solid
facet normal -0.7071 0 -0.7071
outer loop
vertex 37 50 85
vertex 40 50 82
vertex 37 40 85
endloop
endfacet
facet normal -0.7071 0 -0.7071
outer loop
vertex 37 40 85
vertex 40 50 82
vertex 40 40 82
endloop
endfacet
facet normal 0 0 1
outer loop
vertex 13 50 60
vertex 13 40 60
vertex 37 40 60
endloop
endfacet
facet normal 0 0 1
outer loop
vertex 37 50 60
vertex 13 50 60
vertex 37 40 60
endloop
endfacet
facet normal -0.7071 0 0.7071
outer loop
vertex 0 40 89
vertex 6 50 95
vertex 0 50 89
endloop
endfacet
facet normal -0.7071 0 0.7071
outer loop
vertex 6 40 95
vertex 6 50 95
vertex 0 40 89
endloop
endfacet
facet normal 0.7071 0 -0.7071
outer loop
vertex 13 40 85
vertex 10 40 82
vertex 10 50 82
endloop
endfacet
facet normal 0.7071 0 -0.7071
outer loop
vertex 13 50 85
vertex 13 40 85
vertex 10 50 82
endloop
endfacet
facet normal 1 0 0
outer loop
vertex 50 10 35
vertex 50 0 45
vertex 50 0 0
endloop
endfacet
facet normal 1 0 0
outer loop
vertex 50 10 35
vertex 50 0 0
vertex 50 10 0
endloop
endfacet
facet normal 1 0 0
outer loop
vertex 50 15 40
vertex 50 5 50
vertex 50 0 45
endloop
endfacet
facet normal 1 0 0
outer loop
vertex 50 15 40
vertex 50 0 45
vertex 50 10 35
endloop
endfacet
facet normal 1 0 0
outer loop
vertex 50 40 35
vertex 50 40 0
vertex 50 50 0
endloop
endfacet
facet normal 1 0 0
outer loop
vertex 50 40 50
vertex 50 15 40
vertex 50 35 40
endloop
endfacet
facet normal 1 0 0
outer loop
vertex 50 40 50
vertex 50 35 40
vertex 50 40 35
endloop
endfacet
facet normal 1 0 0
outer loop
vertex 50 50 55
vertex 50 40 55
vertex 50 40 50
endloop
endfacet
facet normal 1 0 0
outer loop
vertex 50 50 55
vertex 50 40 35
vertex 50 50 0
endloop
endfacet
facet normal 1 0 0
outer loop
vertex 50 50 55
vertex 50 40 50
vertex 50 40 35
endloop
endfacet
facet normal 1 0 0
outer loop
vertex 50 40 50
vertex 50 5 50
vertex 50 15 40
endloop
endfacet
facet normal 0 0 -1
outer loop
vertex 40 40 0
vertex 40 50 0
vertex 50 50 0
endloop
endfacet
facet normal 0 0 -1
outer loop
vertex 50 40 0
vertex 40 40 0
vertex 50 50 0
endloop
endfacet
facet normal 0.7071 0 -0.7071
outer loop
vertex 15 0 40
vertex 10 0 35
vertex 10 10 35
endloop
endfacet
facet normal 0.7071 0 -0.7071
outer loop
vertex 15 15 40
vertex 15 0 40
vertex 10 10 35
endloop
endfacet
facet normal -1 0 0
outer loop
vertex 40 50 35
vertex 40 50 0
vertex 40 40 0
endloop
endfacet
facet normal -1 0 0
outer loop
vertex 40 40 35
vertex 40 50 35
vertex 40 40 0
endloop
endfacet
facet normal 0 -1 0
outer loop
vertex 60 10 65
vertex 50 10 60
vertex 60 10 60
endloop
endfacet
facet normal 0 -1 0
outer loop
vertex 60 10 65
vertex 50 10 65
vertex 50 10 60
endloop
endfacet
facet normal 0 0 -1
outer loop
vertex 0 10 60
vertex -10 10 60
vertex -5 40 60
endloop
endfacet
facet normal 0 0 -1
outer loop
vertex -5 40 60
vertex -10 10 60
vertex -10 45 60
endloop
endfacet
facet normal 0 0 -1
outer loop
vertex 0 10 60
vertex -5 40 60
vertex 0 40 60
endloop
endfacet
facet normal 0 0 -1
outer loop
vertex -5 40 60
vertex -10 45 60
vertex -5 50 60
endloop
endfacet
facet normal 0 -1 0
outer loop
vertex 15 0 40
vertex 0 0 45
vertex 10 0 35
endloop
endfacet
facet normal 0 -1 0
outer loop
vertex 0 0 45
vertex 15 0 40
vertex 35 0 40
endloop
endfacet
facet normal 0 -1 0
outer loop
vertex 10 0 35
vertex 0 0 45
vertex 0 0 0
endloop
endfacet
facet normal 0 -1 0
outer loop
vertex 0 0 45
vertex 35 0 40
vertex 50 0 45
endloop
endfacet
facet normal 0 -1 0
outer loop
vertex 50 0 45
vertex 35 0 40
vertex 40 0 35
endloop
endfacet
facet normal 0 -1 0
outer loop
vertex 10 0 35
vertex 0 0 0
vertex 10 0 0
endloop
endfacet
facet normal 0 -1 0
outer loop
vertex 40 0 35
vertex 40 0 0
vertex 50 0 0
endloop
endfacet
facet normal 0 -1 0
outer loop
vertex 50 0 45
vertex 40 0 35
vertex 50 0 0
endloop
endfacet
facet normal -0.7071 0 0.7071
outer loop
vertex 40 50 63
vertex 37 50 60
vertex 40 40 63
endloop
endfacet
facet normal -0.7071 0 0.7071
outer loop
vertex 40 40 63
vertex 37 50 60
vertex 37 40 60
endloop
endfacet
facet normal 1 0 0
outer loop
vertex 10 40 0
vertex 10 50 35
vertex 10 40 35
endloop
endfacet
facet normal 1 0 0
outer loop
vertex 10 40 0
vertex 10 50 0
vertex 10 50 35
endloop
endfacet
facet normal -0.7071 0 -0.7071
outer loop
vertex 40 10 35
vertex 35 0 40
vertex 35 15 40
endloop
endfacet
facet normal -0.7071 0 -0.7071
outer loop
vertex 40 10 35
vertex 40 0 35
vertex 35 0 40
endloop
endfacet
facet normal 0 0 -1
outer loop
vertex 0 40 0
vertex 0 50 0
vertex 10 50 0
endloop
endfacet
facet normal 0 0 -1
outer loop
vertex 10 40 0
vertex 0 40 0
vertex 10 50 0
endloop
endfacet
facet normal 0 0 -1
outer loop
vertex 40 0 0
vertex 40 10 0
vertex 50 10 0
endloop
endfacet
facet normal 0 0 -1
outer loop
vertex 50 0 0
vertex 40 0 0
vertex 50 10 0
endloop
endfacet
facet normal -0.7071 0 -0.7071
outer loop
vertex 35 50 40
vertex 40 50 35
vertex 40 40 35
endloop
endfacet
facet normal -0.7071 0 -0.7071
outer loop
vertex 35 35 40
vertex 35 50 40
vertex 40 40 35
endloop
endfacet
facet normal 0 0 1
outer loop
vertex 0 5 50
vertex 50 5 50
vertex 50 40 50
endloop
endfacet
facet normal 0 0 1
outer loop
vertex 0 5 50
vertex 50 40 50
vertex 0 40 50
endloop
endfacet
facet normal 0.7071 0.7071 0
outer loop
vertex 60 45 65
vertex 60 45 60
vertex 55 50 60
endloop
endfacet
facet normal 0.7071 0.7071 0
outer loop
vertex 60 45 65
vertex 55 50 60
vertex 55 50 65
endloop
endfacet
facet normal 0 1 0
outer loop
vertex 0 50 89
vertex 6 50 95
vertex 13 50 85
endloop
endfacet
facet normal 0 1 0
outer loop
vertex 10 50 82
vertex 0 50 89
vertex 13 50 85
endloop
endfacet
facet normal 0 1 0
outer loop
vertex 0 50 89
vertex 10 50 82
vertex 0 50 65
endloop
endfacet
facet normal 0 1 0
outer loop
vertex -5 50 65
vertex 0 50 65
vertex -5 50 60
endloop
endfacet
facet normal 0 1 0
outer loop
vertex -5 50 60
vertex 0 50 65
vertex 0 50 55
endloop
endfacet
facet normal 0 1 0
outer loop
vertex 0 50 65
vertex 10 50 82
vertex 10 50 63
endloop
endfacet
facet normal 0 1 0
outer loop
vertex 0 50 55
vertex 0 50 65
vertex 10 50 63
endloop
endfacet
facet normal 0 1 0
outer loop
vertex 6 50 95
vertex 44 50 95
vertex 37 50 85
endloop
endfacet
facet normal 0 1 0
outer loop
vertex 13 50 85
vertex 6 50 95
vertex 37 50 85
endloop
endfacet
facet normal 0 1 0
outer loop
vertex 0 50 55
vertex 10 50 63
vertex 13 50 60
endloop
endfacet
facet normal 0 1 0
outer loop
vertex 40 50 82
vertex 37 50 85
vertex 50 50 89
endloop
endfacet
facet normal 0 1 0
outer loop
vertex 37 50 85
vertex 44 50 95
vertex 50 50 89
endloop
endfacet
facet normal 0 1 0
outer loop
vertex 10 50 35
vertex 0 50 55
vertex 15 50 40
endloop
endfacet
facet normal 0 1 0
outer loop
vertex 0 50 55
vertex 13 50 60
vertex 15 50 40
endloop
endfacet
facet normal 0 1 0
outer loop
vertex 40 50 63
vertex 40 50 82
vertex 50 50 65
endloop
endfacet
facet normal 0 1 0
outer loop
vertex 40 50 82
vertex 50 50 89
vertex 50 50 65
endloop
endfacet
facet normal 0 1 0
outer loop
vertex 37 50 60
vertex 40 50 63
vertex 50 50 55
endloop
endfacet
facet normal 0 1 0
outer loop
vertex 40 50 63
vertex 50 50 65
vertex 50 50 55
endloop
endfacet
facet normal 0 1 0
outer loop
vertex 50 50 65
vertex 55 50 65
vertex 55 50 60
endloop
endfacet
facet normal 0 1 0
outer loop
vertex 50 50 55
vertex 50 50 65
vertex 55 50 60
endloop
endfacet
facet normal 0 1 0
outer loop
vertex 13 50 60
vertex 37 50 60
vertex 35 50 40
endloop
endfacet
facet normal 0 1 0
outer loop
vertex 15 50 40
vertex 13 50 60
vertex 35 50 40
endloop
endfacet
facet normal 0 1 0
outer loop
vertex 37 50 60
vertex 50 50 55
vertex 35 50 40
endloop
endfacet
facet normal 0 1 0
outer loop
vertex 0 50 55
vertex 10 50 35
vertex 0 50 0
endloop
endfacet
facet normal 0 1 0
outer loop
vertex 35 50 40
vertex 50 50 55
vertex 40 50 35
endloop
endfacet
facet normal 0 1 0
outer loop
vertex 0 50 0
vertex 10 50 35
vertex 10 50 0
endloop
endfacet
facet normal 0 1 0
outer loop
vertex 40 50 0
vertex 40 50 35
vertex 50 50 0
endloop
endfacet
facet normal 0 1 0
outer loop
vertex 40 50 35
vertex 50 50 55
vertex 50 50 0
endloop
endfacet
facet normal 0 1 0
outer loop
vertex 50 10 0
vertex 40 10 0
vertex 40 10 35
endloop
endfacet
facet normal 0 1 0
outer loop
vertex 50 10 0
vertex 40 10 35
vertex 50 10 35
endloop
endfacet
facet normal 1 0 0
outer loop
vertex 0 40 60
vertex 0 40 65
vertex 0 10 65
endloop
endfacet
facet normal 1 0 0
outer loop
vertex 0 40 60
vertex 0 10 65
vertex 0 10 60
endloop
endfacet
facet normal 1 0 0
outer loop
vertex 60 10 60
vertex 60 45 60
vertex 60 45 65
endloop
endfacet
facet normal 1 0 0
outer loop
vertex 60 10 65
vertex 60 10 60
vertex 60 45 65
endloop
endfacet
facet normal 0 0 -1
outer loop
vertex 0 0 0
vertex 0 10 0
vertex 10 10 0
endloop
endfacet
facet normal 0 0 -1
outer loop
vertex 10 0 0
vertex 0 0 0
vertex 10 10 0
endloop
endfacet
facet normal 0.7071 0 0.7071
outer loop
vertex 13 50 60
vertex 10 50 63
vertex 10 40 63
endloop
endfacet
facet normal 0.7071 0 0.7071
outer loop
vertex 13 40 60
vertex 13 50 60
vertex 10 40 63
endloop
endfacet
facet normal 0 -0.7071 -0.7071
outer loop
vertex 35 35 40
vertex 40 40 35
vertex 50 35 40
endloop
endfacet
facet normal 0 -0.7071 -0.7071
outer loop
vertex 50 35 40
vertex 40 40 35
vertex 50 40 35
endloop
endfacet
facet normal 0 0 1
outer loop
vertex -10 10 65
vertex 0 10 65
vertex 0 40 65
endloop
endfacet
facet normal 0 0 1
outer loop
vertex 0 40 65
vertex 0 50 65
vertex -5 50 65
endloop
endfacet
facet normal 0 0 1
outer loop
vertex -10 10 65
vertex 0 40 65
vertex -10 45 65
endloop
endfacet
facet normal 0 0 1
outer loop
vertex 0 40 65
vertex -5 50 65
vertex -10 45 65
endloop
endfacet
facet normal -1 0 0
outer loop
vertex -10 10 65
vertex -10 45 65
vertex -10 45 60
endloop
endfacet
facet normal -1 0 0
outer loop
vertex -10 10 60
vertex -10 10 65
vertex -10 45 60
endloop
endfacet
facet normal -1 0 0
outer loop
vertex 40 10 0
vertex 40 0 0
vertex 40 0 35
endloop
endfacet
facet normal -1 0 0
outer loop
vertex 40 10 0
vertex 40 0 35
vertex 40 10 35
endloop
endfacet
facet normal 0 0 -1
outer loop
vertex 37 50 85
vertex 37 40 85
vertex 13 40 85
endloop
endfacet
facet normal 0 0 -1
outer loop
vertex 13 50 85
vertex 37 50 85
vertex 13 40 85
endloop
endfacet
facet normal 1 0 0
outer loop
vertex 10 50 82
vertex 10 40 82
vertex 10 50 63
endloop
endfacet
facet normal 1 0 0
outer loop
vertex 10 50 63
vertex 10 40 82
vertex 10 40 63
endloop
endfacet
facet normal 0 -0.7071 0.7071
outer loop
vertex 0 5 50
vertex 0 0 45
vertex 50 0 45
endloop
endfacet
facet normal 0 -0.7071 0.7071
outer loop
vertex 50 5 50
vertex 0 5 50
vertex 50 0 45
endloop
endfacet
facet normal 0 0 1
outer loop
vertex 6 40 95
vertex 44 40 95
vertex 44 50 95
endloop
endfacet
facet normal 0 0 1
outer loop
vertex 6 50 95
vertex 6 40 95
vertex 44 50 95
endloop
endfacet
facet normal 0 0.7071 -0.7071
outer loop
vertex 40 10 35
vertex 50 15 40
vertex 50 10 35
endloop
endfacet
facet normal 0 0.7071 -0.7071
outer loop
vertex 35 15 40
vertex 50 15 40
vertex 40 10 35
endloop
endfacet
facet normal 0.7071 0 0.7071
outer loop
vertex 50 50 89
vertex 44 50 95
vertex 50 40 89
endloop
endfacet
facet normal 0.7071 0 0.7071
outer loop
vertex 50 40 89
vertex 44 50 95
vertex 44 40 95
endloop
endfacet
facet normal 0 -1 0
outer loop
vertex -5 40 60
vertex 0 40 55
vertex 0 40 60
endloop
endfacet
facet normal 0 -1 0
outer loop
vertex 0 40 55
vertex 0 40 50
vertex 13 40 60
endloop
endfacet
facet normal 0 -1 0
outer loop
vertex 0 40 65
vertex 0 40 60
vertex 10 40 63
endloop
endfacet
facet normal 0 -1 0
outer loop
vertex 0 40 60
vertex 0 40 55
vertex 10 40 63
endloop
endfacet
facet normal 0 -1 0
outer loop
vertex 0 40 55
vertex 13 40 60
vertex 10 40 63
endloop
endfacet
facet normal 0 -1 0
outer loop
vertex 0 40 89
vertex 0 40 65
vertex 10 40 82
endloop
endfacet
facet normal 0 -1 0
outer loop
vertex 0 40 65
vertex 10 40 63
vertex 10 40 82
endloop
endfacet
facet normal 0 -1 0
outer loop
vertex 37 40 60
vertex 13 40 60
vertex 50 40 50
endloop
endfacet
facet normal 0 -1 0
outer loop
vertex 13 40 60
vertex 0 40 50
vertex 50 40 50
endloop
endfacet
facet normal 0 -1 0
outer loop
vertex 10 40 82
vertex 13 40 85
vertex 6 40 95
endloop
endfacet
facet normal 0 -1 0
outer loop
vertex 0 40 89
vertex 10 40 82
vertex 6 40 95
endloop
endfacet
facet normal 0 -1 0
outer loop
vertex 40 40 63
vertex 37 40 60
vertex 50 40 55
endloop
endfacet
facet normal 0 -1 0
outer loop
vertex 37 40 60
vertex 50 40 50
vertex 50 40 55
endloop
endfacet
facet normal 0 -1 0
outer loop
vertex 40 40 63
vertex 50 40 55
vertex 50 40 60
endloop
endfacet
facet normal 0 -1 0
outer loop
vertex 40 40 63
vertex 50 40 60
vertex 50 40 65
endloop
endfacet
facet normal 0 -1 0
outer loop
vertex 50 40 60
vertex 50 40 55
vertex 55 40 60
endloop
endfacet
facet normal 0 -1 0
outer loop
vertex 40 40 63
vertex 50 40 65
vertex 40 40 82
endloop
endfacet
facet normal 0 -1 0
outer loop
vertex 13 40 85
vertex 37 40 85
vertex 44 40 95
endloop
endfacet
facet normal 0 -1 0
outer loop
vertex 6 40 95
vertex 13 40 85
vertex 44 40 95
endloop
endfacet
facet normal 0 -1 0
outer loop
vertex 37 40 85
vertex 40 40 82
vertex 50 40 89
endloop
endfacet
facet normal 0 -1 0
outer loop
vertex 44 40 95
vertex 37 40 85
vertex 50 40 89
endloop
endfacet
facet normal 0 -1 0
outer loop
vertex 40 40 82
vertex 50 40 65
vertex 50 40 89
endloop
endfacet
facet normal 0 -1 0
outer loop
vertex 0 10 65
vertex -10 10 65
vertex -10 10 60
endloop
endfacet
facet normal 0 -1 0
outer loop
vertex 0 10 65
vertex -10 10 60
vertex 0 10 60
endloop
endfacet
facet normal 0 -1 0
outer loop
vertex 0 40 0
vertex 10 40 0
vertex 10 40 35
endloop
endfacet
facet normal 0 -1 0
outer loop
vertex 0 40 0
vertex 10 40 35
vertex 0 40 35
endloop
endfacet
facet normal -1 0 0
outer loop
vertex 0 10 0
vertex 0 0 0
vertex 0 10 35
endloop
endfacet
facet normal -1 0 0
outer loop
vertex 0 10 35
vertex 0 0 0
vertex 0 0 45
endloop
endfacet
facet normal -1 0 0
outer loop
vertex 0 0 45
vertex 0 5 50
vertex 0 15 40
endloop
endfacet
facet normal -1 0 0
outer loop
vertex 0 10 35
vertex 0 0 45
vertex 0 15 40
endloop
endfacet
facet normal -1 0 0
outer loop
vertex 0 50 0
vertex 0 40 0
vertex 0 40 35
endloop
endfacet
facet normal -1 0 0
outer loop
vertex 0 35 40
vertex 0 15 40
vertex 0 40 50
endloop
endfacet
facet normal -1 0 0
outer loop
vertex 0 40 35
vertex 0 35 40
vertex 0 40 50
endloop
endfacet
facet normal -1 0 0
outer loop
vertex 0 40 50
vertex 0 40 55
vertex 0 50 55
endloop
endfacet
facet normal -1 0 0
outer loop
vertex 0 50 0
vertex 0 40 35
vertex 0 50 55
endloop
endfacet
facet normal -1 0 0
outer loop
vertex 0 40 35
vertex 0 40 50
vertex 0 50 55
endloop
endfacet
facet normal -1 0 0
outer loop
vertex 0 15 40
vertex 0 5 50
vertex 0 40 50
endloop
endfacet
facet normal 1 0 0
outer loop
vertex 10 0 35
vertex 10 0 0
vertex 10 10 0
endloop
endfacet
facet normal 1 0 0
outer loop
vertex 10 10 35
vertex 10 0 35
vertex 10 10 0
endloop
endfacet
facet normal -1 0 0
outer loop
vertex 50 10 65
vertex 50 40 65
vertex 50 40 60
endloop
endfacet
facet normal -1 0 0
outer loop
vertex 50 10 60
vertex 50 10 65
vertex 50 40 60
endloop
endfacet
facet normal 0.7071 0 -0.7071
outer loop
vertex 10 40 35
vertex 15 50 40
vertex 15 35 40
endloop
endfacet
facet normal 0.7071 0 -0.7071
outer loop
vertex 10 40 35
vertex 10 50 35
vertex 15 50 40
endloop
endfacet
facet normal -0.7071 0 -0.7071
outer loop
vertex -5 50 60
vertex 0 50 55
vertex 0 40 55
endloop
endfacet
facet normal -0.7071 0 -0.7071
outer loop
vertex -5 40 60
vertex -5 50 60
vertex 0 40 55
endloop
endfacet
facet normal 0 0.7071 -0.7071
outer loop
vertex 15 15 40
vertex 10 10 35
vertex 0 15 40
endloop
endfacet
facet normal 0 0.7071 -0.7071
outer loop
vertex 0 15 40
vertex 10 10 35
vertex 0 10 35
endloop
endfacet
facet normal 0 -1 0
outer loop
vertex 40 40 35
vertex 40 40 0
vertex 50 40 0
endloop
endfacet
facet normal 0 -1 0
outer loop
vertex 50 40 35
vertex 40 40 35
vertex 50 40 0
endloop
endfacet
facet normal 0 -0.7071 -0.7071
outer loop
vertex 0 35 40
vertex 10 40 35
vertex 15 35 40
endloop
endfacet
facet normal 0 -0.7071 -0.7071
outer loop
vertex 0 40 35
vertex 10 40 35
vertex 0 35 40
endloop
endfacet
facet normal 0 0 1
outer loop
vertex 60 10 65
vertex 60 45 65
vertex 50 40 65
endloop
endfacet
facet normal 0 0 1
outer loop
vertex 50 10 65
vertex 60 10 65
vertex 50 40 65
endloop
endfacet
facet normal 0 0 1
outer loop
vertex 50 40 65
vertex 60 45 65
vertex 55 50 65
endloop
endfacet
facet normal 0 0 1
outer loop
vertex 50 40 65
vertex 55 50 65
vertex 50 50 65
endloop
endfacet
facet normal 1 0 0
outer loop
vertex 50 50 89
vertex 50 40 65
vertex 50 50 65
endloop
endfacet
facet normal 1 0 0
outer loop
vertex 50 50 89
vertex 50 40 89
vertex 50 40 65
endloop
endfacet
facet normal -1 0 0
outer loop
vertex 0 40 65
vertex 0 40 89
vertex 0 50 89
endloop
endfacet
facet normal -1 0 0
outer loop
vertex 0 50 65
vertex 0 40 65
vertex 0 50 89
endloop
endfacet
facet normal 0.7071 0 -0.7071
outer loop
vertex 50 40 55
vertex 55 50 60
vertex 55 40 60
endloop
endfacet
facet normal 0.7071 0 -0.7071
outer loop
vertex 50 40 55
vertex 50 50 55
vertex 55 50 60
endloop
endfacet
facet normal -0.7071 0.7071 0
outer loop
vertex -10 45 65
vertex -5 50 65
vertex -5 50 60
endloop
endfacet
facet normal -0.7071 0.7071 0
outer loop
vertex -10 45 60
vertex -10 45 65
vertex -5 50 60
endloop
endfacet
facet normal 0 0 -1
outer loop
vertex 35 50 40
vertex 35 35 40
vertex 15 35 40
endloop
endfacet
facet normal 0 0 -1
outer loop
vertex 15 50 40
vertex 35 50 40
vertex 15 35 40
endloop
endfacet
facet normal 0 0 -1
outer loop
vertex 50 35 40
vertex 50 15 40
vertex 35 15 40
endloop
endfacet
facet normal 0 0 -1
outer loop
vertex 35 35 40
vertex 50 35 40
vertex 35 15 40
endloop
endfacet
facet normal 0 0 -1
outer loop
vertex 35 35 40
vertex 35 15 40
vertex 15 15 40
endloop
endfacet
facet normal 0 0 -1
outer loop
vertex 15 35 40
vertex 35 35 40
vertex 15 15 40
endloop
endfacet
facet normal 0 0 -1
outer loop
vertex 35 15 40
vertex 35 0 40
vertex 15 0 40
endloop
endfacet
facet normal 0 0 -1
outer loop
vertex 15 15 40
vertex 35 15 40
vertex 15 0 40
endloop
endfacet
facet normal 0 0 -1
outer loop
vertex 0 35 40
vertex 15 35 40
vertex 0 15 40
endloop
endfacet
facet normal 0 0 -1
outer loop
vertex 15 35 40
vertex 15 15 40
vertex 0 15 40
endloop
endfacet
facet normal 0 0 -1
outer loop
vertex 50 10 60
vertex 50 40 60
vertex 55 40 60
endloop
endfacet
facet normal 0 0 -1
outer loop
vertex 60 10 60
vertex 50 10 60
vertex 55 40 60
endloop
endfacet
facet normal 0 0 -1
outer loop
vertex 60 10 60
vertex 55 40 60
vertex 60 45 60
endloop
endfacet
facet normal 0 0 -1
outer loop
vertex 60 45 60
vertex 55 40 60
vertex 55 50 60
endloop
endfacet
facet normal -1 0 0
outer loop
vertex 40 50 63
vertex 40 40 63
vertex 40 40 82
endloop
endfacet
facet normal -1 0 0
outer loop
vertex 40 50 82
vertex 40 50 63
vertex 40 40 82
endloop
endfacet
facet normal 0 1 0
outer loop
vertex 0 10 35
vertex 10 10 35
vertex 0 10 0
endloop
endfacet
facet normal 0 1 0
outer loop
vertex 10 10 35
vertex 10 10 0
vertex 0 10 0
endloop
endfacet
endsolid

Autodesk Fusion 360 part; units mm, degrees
sketch "Sketch1" plane through (0, 0, 0) normal (0, 0, 1) x (1, 0, 0) in component "Chair Brutaliste"
  line L0 (0, 0) -> (10, 0)
  line L1 (10, 0) -> (10, 10)
  line L2 (10, 10) -> (0, 10)
  line L3 (0, 10) -> (0, 0)
  line L4 (0, 0) -> (50, 0) construction
  line L5 (50, 0) -> (50, 50) construction
  line L6 (50, 50) -> (0, 50) construction
  line L7 (50, 0) -> (40, 0)
  line L8 (40, 0) -> (40, 10)
  line L9 (40, 10) -> (50, 10)
  line L10 (50, 10) -> (50, 0)
  line L11 (50, 50) -> (40, 50)
  line L12 (40, 50) -> (40, 40)
  line L13 (40, 40) -> (50, 40)
  line L14 (50, 40) -> (50, 50)
  line L15 (0, 50) -> (10, 50)
  line L16 (10, 50) -> (10, 40)
  line L17 (10, 40) -> (0, 40)
  line L18 (0, 40) -> (0, 50)
  dimension "d1" = 10
  dimension "d2" = 50
extrude "Extrude1" add sketch "Sketch1" along normal blind 40 makes body 1 at (3.3333, 50, 13.3333) makes body 2 at (0, 6.6667, 13.3333) makes body 3 at (50, 43.3333, 13.3333) makes body 4 at (43.3333, 10, 13.3333) in component "Chair Brutaliste"
sketch "Sketch2" plane through (0, 0, 40) normal (0, 0, 1) x (-1, 0, 0) in component "Chair Brutaliste"
  line L0 (-50, -10) -> (-40, -10)
  line L1 (-40, -10) -> (-40, 0)
  line L2 (-40, 0) -> (-50, 0)
  line L3 (-50, 0) -> (-50, -10)
  line L4 (-50, -50) -> (0, -50)
  line L5 (0, -50) -> (0, 0)
  line L6 (0, 0) -> (-50, 0)
  line L7 (-50, 0) -> (-50, -50)
extrude "Extrude2" add sketch "Sketch2" along normal blind 10 bodies 1 2 3 4 in component "Chair Brutaliste"
sketch "Sketch3" plane through (50, 0, 0) normal (1, 0, 0) x (0, 1, 0) in component "Chair Brutaliste"
  line L0 (40, 0) -> (50, 0)
  line L1 (50, 0) -> (50, 50)
  line L2 (50, 50) -> (0, 50)
  line L3 (0, 50) -> (0, 0)
  line L4 (0, 0) -> (10, 0)
  line L5 (10, 0) -> (10, 40)
  line L6 (10, 40) -> (40, 40)
  line L7 (40, 40) -> (40, 0)
  line L8 (50, 50) -> (40, 50)
  line L9 (40, 50) -> (40, 95)
  line L10 (40, 95) -> (50, 95)
  line L11 (50, 95) -> (50, 50)
  dimension "d8" = 10
  dimension "d9" = 45
extrude "Extrude3" add sketch "Sketch3" against normal up to surface (50 mm away) contours L2 L8 L9 L10 L11 bodies 1 in component "Chair Brutaliste"
sketch "Sketch4" plane through (0, 40, 0) normal (0, -1, 0) x (1, 0, 0) in component "Chair Brutaliste"
  line L0 (0, 95) -> (0, 50)
  line L1 (0, 50) -> (50, 50)
  line L2 (50, 50) -> (50, 95)
  line L3 (50, 95) -> (0, 95)
  line L4 (10, 60) -> (40, 60)
  line L5 (40, 60) -> (40, 85)
  line L6 (40, 85) -> (10, 85)
  line L7 (10, 85) -> (10, 60)
  dimension "d13" = -10
extrude "Extrude4" cut sketch "Sketch4" against normal up to surface (10 mm away) contours L4 L5 L6 L7 bodies 1 in component "Chair Brutaliste"
chamfer "Chamfer2" distance 5 angle 45 8 edges at (10, 45, 40) (10, 5, 40) (40, 45, 40) (40, 5, 40) (5, 40, 40) (5, 10, 40) (45, 40, 40) (45, 10, 40) on bodies 1 in component "Chair Brutaliste"
chamfer "Chamfer3" distance 3 angle 45 4 edges at (40, 45, 85) (10, 45, 85) (10, 45, 60) (40, 45, 60) on bodies 1 in component "Chair Brutaliste"
chamfer "Chamfer4" distance 6 angle 45 2 edges at (50, 45, 95) (0, 45, 95) on bodies 1 in component "Chair Brutaliste"
sketch "Sketch5" plane through (50, 0, 0) normal (1, 0, 0) x (0, 1, 0) in component "Chair Brutaliste"
  line L0 (50, 89) -> (40, 89)
  line L1 (40, 89) -> (40, 50)
  line L2 (40, 50) -> (0, 50)
  line L3 (0, 50) -> (0, 0)
  line L4 (0, 0) -> (10, 0)
  line L5 (10, 0) -> (10, 35)
  line L6 (10, 35) -> (15, 40)
  line L7 (15, 40) -> (35, 40)
  line L8 (35, 40) -> (40, 35)
  line L9 (40, 35) -> (40, 0)
  line L10 (40, 0) -> (50, 0)
  line L11 (50, 0) -> (50, 89)
  line L12 (40, 50) -> (40, 60) construction
  line L13 (40, 60) -> (40, 65)
  line L14 (40, 60) -> (50, 60)
  line L15 (40, 65) -> (50, 65)
  line L16 (50, 60) -> (50, 65)
  dimension "d19" = 5
  dimension "d20" = 10
extrude "Extrude5" add sketch "Sketch5" along normal blind 10 contours L1 L11 L13 L14 L15 L16 bodies 1 in component "Chair Brutaliste"
sketch "Sketch6" plane through (0, 40, 0) normal (0, -1, 0) x (1, 0, 0) in component "Chair Brutaliste"
  line L0 (13, 85) -> (37, 85)
  line L1 (37, 85) -> (40, 82)
  line L2 (40, 82) -> (40, 63)
  line L3 (40, 63) -> (37, 60)
  line L4 (37, 60) -> (13, 60)
  line L5 (13, 60) -> (10, 63)
  line L6 (10, 63) -> (10, 82)
  line L7 (10, 82) -> (13, 85)
  line L8 (6, 95) -> (0, 89)
  line L9 (0, 89) -> (0, 50)
  line L10 (0, 50) -> (50, 50)
  line L11 (50, 50) -> (50, 60)
  line L12 (50, 60) -> (60, 60)
  line L13 (60, 60) -> (60, 65)
  line L14 (60, 65) -> (50, 65)
  line L15 (50, 65) -> (50, 89)
  line L16 (50, 89) -> (44, 95)
  line L17 (44, 95) -> (6, 95)
  line L18 (50, 65) -> (50, 60)
extrude "Extrude6" add sketch "Sketch6" along normal blind 30 contours L12 L13 L14 L18 bodies 1 in component "Chair Brutaliste"
ref_plane "WorkPlane1" through (25, 25, 44.5) normal (-1, 0, 0) x (0, -1, 0) in component "Chair Brutaliste"
mirror "Mirror1" about plane through (25, 25, 44.5) normal (-1, 0, 0) of "Extrude5" in component "Chair Brutaliste"
sketch "Sketch7" plane through (0, 40, 0) normal (0, -1, 0) x (1, 0, 0) in component "Chair Brutaliste"
  line L0 (50, 60) -> (50, 65)
  line L1 (50, 65) -> (50, 89)
  line L2 (50, 89) -> (44, 95)
  line L3 (44, 95) -> (6, 95)
  line L4 (6, 95) -> (0, 89)
  line L5 (0, 89) -> (0, 65)
  line L6 (0, 65) -> (-10, 65)
  line L7 (-10, 65) -> (-10, 60)
  line L8 (-10, 60) -> (0, 60)
  line L9 (0, 60) -> (0, 50)
  line L10 (0, 50) -> (50, 50)
  line L11 (13, 85) -> (37, 85)
  line L12 (37, 85) -> (40, 82)
  line L13 (40, 82) -> (40, 63)
  line L14 (40, 63) -> (37, 60)
  line L15 (37, 60) -> (13, 60)
  line L16 (13, 60) -> (10, 63)
  line L17 (10, 63) -> (10, 82)
  line L18 (10, 82) -> (13, 85)
  line L19 (0, 65) -> (0, 60)
  line L20 (50, 50) -> (50, 60)
extrude "Extrude7" add sketch "Sketch7" along normal up to surface (30 mm away) contours L6 L7 L8 L19 bodies 1 in component "Chair Brutaliste"
chamfer "Chamfer6" distance 5 angle 45 1 edges at (25, 0, 50) on bodies 1 in component "Chair Brutaliste"
chamfer "Chamfer7" distance 5 angle 45 2 edges at (60, 50, 62.5) (-10, 50, 62.5) on bodies 1 in component "Chair Brutaliste"
chamfer "Chamfer8" distance 5 angle 45 2 edges at (50, 45, 60) (0, 45, 60) on bodies 1 in component "Chair Brutaliste"
component "Chair Brutaliste" placed x (1, 0, 0) y (0, 1, 0) z (0, 0, 1) at (0, 0, 0)
